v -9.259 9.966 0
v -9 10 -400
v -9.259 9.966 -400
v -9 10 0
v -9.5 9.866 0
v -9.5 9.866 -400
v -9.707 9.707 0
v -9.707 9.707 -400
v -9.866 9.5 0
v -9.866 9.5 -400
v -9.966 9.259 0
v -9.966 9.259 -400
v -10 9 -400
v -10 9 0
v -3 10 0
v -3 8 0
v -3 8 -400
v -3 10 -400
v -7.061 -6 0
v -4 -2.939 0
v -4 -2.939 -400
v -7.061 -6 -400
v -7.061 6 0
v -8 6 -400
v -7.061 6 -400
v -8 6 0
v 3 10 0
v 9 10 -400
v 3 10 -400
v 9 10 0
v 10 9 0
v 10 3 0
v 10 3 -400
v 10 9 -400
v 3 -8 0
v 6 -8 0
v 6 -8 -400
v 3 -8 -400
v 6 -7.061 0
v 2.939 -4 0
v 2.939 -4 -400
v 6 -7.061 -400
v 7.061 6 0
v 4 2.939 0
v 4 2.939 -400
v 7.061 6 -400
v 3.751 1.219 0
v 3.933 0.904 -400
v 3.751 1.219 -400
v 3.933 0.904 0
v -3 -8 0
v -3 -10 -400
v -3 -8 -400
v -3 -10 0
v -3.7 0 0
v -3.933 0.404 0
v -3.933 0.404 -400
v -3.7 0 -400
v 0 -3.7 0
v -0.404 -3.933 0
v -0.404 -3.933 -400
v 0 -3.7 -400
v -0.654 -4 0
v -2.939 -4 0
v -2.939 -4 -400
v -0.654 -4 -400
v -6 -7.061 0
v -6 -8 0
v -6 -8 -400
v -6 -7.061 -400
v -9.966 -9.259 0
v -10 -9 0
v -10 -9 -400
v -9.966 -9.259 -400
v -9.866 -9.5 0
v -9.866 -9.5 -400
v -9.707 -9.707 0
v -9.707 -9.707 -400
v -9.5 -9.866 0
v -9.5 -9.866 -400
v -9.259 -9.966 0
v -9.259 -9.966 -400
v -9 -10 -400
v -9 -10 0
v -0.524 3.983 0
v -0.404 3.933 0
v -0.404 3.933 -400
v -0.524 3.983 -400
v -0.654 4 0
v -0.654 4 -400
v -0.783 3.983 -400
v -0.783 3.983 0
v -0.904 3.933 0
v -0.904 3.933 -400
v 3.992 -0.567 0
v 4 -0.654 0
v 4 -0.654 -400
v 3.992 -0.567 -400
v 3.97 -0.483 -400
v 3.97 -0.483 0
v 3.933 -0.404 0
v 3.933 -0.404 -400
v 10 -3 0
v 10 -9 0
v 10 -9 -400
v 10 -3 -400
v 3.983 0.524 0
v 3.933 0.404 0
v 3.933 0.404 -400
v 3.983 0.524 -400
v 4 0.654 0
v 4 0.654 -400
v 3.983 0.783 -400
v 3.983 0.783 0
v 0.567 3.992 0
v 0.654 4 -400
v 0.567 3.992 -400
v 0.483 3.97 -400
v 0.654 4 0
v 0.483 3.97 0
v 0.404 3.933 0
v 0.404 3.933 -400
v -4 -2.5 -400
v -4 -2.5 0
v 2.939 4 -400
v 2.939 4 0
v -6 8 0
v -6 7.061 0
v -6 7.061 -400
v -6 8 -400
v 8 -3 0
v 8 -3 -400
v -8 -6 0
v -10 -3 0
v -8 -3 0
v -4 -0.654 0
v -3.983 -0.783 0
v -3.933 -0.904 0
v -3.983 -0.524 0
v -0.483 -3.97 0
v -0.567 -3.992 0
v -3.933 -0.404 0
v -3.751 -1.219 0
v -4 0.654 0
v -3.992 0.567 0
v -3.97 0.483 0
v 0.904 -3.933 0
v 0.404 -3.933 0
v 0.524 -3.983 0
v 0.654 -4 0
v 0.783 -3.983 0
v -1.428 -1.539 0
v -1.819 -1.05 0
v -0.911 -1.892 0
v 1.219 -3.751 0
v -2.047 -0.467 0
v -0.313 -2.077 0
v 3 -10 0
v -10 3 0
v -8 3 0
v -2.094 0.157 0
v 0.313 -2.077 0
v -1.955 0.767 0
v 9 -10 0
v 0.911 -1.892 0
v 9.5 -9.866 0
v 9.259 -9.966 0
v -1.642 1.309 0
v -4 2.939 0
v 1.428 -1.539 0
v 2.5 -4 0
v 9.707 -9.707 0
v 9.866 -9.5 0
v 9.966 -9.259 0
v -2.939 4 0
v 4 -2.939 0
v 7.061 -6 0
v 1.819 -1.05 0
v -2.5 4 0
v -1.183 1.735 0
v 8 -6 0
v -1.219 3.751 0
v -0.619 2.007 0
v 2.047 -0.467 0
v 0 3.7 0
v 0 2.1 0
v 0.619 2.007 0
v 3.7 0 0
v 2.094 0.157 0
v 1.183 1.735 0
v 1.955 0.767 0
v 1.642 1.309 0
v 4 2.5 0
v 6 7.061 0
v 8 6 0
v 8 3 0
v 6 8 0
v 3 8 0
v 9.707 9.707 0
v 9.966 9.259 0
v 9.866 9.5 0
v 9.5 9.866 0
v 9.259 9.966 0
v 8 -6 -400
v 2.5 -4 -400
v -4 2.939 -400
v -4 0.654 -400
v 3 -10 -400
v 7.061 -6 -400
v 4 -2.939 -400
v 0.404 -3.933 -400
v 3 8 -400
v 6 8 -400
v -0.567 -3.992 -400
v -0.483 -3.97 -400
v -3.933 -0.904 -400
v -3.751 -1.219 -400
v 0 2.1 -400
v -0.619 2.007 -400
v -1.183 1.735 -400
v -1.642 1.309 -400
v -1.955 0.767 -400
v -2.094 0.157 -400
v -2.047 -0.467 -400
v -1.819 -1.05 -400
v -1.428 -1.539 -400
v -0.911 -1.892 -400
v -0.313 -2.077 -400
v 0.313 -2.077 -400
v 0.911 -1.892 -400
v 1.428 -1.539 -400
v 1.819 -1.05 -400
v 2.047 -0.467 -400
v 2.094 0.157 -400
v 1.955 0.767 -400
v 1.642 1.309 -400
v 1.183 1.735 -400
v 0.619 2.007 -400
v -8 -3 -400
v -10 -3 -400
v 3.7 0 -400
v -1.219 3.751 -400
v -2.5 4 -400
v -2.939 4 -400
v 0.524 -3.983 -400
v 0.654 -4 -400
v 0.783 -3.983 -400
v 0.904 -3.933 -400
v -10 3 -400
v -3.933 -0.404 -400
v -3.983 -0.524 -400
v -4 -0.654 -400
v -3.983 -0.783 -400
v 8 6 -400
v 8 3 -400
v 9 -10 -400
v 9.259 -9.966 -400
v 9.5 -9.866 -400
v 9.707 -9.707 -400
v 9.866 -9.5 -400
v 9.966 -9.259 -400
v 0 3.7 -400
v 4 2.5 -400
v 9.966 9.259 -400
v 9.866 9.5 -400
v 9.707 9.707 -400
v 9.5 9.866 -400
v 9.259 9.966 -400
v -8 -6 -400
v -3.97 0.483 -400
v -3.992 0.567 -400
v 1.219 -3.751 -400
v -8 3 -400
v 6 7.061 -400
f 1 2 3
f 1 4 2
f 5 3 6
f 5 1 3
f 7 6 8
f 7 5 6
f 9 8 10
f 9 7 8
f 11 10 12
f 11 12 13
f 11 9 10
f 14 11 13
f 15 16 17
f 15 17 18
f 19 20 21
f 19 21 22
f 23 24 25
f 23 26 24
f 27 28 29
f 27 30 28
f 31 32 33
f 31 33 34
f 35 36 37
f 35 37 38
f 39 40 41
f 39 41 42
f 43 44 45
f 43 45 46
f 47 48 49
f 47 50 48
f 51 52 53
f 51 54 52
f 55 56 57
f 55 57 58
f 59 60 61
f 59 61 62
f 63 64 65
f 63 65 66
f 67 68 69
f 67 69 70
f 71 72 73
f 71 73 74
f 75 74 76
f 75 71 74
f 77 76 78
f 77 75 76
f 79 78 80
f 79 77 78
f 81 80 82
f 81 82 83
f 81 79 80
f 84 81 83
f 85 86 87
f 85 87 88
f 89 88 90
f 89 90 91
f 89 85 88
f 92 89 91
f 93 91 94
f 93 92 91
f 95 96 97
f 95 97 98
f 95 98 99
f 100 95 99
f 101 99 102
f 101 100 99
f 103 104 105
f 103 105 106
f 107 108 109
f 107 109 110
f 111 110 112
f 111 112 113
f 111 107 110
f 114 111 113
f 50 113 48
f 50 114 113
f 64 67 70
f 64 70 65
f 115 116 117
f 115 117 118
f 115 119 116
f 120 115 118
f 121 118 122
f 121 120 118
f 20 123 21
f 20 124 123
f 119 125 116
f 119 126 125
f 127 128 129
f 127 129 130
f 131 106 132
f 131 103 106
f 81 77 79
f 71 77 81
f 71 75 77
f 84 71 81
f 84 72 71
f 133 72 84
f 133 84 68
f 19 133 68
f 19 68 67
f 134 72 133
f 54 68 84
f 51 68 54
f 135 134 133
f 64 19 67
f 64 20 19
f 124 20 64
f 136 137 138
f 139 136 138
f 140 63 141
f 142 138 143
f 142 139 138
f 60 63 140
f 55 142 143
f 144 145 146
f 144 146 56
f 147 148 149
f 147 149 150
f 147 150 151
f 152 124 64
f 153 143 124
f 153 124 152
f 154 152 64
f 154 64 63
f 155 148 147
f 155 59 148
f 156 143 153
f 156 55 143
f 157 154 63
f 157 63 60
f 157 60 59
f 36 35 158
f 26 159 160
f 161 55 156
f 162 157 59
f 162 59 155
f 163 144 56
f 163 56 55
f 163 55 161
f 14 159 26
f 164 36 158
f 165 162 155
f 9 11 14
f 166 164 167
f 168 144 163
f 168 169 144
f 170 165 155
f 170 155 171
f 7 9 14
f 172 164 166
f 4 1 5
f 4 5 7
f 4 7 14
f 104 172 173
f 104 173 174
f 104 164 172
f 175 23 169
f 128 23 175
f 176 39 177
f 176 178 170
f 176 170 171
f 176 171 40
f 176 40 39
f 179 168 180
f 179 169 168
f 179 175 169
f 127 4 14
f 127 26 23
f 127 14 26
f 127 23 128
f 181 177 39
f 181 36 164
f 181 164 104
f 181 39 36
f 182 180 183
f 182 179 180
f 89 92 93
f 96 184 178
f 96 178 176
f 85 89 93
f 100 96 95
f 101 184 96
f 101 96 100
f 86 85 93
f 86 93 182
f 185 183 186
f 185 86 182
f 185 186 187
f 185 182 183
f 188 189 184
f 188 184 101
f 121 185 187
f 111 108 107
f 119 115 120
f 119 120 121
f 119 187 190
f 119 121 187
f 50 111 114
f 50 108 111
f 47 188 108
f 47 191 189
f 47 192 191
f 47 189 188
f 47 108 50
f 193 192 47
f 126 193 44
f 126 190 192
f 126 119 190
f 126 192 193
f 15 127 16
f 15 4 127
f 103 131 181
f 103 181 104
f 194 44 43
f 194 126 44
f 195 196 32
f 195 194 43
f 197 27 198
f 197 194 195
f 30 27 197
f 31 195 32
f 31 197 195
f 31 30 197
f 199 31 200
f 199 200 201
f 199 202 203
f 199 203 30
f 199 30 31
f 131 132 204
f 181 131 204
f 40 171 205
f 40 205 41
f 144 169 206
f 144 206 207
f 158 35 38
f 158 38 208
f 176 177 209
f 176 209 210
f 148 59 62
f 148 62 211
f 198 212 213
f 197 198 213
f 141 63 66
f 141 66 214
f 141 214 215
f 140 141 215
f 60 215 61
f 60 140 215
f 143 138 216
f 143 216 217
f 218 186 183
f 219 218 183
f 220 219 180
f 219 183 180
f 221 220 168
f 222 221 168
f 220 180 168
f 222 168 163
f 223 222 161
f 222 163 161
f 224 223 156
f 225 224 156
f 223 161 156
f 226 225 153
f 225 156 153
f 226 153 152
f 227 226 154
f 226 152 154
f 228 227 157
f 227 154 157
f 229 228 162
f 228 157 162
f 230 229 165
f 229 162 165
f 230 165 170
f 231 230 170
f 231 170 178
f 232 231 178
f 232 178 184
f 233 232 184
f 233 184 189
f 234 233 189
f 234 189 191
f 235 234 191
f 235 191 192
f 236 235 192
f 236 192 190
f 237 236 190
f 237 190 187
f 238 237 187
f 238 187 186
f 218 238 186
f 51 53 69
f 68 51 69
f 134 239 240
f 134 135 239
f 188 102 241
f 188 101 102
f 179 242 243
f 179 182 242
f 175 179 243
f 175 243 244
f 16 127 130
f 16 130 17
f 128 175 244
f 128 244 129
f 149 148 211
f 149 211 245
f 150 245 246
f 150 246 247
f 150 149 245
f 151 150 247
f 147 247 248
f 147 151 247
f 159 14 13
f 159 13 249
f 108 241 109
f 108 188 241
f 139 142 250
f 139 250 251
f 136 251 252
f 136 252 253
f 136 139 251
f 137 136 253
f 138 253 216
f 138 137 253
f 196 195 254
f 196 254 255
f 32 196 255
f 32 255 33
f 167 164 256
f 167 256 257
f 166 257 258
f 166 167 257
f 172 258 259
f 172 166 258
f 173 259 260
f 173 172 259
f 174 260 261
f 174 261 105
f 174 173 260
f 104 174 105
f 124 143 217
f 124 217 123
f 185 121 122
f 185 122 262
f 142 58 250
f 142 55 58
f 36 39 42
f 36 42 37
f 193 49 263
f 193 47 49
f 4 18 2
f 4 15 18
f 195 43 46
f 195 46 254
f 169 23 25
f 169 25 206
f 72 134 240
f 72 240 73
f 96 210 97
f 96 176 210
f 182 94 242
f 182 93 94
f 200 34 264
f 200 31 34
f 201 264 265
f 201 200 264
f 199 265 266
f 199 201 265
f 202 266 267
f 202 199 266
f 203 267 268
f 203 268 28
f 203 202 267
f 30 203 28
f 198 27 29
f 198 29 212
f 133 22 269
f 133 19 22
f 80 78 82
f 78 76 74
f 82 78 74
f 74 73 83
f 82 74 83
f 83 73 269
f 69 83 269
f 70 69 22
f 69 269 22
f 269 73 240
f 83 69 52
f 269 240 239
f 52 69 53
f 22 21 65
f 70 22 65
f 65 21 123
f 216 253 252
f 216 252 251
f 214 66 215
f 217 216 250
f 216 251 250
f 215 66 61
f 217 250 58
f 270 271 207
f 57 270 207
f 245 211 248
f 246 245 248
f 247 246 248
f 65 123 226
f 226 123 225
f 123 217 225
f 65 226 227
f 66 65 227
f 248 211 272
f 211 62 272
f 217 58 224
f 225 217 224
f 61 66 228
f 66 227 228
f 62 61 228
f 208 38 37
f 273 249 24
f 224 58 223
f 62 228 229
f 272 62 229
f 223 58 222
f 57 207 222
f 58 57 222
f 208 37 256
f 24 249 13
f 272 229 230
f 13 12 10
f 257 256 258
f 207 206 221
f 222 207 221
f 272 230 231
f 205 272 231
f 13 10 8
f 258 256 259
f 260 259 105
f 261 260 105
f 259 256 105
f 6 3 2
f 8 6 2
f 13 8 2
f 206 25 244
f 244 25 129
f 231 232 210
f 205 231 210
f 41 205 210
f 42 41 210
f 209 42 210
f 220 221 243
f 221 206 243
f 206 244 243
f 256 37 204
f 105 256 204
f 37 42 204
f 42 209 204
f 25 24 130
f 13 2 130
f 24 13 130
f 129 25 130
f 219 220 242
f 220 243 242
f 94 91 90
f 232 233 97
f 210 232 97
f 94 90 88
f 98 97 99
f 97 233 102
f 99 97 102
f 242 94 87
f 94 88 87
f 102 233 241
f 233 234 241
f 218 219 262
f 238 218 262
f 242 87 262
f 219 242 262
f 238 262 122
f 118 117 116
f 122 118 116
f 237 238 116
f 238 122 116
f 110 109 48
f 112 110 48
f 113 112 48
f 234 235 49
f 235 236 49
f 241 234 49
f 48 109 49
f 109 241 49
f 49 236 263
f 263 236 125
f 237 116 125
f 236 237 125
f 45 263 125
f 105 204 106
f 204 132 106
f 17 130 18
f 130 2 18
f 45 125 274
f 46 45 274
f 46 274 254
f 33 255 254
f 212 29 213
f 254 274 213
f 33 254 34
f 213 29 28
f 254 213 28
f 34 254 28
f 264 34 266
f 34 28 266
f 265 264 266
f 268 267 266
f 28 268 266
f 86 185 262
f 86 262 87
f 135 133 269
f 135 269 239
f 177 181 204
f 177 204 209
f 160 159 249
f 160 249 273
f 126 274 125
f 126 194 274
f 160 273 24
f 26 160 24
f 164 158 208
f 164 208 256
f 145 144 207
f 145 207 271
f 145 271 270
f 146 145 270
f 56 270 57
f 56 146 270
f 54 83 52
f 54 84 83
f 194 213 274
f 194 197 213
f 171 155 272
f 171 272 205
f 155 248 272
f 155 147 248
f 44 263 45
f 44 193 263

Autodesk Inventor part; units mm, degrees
sketch "Sketch_75" plane through (0, 0, 0) normal (0, 0, 1) x (1, 0, 0)
  line L0 (-10, -3) -> (-10, -9)
  arc A0 (-10, -9) -> (-9, -10) centre (-9, -9) ccw
  line L1 (-9, -10) -> (-3, -10)
  line L2 (-3, -10) -> (-3, -8)
  line L3 (-3, -8) -> (-6, -8)
  line L4 (-6, -8) -> (-6, -7.0607)
  line L5 (-6, -7.0607) -> (-2.9393, -4)
  line L6 (-2.9393, -4) -> (-0.6536, -4)
  arc A1 (-0.6536, -4) -> (-0.4036, -3.933) centre (-0.6536, -3.5) ccw
  line L7 (-0.4036, -3.933) -> (0, -3.7)
  line L8 (0, -3.7) -> (0.4036, -3.933)
  arc A2 (0.4036, -3.933) -> (0.9036, -3.933) centre (0.6536, -3.5) ccw
  line L9 (0.9036, -3.933) -> (1.2189, -3.751)
  line L10 (1.2189, -3.751) -> (2.5, -4)
  line L11 (2.5, -4) -> (2.9393, -4)
  line L12 (2.9393, -4) -> (6, -7.0607)
  line L13 (6, -7.0607) -> (6, -8)
  line L14 (6, -8) -> (3, -8)
  line L15 (3, -8) -> (3, -10)
  line L16 (3, -10) -> (9, -10)
  arc A3 (9, -10) -> (10, -9) centre (9, -9) ccw
  line L17 (10, -9) -> (10, -3)
  line L18 (10, -3) -> (8, -3)
  line L19 (8, -3) -> (8, -6)
  line L20 (8, -6) -> (7.0607, -6)
  line L21 (7.0607, -6) -> (4, -2.9393)
  line L22 (4, -2.9393) -> (4, -0.6536)
  arc A4 (4, -0.6536) -> (3.933, -0.4036) centre (3.5, -0.6536) ccw
  line L23 (3.933, -0.4036) -> (3.7, 0)
  line L24 (3.7, 0) -> (3.933, 0.4036)
  arc A5 (3.933, 0.4036) -> (3.933, 0.9036) centre (3.5, 0.6536) ccw
  line L25 (3.933, 0.9036) -> (3.751, 1.2189)
  line L26 (3.751, 1.2189) -> (4, 2.5)
  line L27 (4, 2.5) -> (4, 2.9393)
  line L28 (4, 2.9393) -> (7.0607, 6)
  line L29 (7.0607, 6) -> (8, 6)
  line L30 (8, 6) -> (8, 3)
  line L31 (8, 3) -> (10, 3)
  line L32 (10, 3) -> (10, 9)
  arc A6 (10, 9) -> (9, 10) centre (9, 9) ccw
  line L33 (9, 10) -> (3, 10)
  line L34 (3, 10) -> (3, 8)
  line L35 (3, 8) -> (6, 8)
  line L36 (6, 8) -> (6, 7.0607)
  line L37 (6, 7.0607) -> (2.9393, 4)
  line L38 (2.9393, 4) -> (0.6536, 4)
  arc A7 (0.6536, 4) -> (0.4036, 3.933) centre (0.6536, 3.5) ccw
  line L39 (0.4036, 3.933) -> (0, 3.7)
  line L40 (0, 3.7) -> (-0.4036, 3.933)
  arc A8 (-0.4036, 3.933) -> (-0.9036, 3.933) centre (-0.6536, 3.5) ccw
  line L41 (-0.9036, 3.933) -> (-1.2189, 3.751)
  line L42 (-1.2189, 3.751) -> (-2.5, 4)
  line L43 (-2.5, 4) -> (-2.9393, 4)
  line L44 (-2.9393, 4) -> (-6, 7.0607)
  line L45 (-6, 7.0607) -> (-6, 8)
  line L46 (-6, 8) -> (-3, 8)
  line L47 (-3, 8) -> (-3, 10)
  line L48 (-3, 10) -> (-9, 10)
  arc A9 (-9, 10) -> (-10, 9) centre (-9, 9) ccw
  line L49 (-10, 9) -> (-10, 3)
  line L50 (-10, 3) -> (-8, 3)
  line L51 (-8, 3) -> (-8, 6)
  line L52 (-8, 6) -> (-7.0607, 6)
  line L53 (-7.0607, 6) -> (-4, 2.9393)
  line L54 (-4, 2.9393) -> (-4, 0.6536)
  arc A10 (-4, 0.6536) -> (-3.933, 0.4036) centre (-3.5, 0.6536) ccw
  line L55 (-3.933, 0.4036) -> (-3.7, 0)
  line L56 (-3.7, 0) -> (-3.933, -0.4036)
  arc A11 (-3.933, -0.4036) -> (-3.933, -0.9036) centre (-3.5, -0.6536) ccw
  line L57 (-3.933, -0.9036) -> (-3.751, -1.2189)
  line L58 (-3.751, -1.2189) -> (-4, -2.5)
  line L59 (-4, -2.5) -> (-4, -2.9393)
  line L60 (-4, -2.9393) -> (-7.0607, -6)
  line L61 (-7.0607, -6) -> (-8, -6)
  line L62 (-8, -6) -> (-8, -3)
  line L63 (-8, -3) -> (-10, -3)
extrude "Extrusion1" add sketch "Sketch_75" against normal blind 400
sketch "Sketch2" plane through (0, 0, -400) normal (0, 0, -1) x (-1, 0, 0)
  point P0 (0, 0)
hole "Hole1" at (0, 0, -400) direction (0, 0, 1) diameter 4.2 end through all
ref_plane "C1_XY" through (0, 0, 0) normal (0, 0, 1) x (1, 0, 0)
ref_plane "C1_YZ" through (0, 0, 0) normal (1, 0, 0) x (0, 1, 0)
ref_plane "C1_ZX" through (0, 0, 0) normal (0, 1, 0) x (0, 0, 1)
properties part number "NFS5-2020-351" material "アルミニウム 6061"
